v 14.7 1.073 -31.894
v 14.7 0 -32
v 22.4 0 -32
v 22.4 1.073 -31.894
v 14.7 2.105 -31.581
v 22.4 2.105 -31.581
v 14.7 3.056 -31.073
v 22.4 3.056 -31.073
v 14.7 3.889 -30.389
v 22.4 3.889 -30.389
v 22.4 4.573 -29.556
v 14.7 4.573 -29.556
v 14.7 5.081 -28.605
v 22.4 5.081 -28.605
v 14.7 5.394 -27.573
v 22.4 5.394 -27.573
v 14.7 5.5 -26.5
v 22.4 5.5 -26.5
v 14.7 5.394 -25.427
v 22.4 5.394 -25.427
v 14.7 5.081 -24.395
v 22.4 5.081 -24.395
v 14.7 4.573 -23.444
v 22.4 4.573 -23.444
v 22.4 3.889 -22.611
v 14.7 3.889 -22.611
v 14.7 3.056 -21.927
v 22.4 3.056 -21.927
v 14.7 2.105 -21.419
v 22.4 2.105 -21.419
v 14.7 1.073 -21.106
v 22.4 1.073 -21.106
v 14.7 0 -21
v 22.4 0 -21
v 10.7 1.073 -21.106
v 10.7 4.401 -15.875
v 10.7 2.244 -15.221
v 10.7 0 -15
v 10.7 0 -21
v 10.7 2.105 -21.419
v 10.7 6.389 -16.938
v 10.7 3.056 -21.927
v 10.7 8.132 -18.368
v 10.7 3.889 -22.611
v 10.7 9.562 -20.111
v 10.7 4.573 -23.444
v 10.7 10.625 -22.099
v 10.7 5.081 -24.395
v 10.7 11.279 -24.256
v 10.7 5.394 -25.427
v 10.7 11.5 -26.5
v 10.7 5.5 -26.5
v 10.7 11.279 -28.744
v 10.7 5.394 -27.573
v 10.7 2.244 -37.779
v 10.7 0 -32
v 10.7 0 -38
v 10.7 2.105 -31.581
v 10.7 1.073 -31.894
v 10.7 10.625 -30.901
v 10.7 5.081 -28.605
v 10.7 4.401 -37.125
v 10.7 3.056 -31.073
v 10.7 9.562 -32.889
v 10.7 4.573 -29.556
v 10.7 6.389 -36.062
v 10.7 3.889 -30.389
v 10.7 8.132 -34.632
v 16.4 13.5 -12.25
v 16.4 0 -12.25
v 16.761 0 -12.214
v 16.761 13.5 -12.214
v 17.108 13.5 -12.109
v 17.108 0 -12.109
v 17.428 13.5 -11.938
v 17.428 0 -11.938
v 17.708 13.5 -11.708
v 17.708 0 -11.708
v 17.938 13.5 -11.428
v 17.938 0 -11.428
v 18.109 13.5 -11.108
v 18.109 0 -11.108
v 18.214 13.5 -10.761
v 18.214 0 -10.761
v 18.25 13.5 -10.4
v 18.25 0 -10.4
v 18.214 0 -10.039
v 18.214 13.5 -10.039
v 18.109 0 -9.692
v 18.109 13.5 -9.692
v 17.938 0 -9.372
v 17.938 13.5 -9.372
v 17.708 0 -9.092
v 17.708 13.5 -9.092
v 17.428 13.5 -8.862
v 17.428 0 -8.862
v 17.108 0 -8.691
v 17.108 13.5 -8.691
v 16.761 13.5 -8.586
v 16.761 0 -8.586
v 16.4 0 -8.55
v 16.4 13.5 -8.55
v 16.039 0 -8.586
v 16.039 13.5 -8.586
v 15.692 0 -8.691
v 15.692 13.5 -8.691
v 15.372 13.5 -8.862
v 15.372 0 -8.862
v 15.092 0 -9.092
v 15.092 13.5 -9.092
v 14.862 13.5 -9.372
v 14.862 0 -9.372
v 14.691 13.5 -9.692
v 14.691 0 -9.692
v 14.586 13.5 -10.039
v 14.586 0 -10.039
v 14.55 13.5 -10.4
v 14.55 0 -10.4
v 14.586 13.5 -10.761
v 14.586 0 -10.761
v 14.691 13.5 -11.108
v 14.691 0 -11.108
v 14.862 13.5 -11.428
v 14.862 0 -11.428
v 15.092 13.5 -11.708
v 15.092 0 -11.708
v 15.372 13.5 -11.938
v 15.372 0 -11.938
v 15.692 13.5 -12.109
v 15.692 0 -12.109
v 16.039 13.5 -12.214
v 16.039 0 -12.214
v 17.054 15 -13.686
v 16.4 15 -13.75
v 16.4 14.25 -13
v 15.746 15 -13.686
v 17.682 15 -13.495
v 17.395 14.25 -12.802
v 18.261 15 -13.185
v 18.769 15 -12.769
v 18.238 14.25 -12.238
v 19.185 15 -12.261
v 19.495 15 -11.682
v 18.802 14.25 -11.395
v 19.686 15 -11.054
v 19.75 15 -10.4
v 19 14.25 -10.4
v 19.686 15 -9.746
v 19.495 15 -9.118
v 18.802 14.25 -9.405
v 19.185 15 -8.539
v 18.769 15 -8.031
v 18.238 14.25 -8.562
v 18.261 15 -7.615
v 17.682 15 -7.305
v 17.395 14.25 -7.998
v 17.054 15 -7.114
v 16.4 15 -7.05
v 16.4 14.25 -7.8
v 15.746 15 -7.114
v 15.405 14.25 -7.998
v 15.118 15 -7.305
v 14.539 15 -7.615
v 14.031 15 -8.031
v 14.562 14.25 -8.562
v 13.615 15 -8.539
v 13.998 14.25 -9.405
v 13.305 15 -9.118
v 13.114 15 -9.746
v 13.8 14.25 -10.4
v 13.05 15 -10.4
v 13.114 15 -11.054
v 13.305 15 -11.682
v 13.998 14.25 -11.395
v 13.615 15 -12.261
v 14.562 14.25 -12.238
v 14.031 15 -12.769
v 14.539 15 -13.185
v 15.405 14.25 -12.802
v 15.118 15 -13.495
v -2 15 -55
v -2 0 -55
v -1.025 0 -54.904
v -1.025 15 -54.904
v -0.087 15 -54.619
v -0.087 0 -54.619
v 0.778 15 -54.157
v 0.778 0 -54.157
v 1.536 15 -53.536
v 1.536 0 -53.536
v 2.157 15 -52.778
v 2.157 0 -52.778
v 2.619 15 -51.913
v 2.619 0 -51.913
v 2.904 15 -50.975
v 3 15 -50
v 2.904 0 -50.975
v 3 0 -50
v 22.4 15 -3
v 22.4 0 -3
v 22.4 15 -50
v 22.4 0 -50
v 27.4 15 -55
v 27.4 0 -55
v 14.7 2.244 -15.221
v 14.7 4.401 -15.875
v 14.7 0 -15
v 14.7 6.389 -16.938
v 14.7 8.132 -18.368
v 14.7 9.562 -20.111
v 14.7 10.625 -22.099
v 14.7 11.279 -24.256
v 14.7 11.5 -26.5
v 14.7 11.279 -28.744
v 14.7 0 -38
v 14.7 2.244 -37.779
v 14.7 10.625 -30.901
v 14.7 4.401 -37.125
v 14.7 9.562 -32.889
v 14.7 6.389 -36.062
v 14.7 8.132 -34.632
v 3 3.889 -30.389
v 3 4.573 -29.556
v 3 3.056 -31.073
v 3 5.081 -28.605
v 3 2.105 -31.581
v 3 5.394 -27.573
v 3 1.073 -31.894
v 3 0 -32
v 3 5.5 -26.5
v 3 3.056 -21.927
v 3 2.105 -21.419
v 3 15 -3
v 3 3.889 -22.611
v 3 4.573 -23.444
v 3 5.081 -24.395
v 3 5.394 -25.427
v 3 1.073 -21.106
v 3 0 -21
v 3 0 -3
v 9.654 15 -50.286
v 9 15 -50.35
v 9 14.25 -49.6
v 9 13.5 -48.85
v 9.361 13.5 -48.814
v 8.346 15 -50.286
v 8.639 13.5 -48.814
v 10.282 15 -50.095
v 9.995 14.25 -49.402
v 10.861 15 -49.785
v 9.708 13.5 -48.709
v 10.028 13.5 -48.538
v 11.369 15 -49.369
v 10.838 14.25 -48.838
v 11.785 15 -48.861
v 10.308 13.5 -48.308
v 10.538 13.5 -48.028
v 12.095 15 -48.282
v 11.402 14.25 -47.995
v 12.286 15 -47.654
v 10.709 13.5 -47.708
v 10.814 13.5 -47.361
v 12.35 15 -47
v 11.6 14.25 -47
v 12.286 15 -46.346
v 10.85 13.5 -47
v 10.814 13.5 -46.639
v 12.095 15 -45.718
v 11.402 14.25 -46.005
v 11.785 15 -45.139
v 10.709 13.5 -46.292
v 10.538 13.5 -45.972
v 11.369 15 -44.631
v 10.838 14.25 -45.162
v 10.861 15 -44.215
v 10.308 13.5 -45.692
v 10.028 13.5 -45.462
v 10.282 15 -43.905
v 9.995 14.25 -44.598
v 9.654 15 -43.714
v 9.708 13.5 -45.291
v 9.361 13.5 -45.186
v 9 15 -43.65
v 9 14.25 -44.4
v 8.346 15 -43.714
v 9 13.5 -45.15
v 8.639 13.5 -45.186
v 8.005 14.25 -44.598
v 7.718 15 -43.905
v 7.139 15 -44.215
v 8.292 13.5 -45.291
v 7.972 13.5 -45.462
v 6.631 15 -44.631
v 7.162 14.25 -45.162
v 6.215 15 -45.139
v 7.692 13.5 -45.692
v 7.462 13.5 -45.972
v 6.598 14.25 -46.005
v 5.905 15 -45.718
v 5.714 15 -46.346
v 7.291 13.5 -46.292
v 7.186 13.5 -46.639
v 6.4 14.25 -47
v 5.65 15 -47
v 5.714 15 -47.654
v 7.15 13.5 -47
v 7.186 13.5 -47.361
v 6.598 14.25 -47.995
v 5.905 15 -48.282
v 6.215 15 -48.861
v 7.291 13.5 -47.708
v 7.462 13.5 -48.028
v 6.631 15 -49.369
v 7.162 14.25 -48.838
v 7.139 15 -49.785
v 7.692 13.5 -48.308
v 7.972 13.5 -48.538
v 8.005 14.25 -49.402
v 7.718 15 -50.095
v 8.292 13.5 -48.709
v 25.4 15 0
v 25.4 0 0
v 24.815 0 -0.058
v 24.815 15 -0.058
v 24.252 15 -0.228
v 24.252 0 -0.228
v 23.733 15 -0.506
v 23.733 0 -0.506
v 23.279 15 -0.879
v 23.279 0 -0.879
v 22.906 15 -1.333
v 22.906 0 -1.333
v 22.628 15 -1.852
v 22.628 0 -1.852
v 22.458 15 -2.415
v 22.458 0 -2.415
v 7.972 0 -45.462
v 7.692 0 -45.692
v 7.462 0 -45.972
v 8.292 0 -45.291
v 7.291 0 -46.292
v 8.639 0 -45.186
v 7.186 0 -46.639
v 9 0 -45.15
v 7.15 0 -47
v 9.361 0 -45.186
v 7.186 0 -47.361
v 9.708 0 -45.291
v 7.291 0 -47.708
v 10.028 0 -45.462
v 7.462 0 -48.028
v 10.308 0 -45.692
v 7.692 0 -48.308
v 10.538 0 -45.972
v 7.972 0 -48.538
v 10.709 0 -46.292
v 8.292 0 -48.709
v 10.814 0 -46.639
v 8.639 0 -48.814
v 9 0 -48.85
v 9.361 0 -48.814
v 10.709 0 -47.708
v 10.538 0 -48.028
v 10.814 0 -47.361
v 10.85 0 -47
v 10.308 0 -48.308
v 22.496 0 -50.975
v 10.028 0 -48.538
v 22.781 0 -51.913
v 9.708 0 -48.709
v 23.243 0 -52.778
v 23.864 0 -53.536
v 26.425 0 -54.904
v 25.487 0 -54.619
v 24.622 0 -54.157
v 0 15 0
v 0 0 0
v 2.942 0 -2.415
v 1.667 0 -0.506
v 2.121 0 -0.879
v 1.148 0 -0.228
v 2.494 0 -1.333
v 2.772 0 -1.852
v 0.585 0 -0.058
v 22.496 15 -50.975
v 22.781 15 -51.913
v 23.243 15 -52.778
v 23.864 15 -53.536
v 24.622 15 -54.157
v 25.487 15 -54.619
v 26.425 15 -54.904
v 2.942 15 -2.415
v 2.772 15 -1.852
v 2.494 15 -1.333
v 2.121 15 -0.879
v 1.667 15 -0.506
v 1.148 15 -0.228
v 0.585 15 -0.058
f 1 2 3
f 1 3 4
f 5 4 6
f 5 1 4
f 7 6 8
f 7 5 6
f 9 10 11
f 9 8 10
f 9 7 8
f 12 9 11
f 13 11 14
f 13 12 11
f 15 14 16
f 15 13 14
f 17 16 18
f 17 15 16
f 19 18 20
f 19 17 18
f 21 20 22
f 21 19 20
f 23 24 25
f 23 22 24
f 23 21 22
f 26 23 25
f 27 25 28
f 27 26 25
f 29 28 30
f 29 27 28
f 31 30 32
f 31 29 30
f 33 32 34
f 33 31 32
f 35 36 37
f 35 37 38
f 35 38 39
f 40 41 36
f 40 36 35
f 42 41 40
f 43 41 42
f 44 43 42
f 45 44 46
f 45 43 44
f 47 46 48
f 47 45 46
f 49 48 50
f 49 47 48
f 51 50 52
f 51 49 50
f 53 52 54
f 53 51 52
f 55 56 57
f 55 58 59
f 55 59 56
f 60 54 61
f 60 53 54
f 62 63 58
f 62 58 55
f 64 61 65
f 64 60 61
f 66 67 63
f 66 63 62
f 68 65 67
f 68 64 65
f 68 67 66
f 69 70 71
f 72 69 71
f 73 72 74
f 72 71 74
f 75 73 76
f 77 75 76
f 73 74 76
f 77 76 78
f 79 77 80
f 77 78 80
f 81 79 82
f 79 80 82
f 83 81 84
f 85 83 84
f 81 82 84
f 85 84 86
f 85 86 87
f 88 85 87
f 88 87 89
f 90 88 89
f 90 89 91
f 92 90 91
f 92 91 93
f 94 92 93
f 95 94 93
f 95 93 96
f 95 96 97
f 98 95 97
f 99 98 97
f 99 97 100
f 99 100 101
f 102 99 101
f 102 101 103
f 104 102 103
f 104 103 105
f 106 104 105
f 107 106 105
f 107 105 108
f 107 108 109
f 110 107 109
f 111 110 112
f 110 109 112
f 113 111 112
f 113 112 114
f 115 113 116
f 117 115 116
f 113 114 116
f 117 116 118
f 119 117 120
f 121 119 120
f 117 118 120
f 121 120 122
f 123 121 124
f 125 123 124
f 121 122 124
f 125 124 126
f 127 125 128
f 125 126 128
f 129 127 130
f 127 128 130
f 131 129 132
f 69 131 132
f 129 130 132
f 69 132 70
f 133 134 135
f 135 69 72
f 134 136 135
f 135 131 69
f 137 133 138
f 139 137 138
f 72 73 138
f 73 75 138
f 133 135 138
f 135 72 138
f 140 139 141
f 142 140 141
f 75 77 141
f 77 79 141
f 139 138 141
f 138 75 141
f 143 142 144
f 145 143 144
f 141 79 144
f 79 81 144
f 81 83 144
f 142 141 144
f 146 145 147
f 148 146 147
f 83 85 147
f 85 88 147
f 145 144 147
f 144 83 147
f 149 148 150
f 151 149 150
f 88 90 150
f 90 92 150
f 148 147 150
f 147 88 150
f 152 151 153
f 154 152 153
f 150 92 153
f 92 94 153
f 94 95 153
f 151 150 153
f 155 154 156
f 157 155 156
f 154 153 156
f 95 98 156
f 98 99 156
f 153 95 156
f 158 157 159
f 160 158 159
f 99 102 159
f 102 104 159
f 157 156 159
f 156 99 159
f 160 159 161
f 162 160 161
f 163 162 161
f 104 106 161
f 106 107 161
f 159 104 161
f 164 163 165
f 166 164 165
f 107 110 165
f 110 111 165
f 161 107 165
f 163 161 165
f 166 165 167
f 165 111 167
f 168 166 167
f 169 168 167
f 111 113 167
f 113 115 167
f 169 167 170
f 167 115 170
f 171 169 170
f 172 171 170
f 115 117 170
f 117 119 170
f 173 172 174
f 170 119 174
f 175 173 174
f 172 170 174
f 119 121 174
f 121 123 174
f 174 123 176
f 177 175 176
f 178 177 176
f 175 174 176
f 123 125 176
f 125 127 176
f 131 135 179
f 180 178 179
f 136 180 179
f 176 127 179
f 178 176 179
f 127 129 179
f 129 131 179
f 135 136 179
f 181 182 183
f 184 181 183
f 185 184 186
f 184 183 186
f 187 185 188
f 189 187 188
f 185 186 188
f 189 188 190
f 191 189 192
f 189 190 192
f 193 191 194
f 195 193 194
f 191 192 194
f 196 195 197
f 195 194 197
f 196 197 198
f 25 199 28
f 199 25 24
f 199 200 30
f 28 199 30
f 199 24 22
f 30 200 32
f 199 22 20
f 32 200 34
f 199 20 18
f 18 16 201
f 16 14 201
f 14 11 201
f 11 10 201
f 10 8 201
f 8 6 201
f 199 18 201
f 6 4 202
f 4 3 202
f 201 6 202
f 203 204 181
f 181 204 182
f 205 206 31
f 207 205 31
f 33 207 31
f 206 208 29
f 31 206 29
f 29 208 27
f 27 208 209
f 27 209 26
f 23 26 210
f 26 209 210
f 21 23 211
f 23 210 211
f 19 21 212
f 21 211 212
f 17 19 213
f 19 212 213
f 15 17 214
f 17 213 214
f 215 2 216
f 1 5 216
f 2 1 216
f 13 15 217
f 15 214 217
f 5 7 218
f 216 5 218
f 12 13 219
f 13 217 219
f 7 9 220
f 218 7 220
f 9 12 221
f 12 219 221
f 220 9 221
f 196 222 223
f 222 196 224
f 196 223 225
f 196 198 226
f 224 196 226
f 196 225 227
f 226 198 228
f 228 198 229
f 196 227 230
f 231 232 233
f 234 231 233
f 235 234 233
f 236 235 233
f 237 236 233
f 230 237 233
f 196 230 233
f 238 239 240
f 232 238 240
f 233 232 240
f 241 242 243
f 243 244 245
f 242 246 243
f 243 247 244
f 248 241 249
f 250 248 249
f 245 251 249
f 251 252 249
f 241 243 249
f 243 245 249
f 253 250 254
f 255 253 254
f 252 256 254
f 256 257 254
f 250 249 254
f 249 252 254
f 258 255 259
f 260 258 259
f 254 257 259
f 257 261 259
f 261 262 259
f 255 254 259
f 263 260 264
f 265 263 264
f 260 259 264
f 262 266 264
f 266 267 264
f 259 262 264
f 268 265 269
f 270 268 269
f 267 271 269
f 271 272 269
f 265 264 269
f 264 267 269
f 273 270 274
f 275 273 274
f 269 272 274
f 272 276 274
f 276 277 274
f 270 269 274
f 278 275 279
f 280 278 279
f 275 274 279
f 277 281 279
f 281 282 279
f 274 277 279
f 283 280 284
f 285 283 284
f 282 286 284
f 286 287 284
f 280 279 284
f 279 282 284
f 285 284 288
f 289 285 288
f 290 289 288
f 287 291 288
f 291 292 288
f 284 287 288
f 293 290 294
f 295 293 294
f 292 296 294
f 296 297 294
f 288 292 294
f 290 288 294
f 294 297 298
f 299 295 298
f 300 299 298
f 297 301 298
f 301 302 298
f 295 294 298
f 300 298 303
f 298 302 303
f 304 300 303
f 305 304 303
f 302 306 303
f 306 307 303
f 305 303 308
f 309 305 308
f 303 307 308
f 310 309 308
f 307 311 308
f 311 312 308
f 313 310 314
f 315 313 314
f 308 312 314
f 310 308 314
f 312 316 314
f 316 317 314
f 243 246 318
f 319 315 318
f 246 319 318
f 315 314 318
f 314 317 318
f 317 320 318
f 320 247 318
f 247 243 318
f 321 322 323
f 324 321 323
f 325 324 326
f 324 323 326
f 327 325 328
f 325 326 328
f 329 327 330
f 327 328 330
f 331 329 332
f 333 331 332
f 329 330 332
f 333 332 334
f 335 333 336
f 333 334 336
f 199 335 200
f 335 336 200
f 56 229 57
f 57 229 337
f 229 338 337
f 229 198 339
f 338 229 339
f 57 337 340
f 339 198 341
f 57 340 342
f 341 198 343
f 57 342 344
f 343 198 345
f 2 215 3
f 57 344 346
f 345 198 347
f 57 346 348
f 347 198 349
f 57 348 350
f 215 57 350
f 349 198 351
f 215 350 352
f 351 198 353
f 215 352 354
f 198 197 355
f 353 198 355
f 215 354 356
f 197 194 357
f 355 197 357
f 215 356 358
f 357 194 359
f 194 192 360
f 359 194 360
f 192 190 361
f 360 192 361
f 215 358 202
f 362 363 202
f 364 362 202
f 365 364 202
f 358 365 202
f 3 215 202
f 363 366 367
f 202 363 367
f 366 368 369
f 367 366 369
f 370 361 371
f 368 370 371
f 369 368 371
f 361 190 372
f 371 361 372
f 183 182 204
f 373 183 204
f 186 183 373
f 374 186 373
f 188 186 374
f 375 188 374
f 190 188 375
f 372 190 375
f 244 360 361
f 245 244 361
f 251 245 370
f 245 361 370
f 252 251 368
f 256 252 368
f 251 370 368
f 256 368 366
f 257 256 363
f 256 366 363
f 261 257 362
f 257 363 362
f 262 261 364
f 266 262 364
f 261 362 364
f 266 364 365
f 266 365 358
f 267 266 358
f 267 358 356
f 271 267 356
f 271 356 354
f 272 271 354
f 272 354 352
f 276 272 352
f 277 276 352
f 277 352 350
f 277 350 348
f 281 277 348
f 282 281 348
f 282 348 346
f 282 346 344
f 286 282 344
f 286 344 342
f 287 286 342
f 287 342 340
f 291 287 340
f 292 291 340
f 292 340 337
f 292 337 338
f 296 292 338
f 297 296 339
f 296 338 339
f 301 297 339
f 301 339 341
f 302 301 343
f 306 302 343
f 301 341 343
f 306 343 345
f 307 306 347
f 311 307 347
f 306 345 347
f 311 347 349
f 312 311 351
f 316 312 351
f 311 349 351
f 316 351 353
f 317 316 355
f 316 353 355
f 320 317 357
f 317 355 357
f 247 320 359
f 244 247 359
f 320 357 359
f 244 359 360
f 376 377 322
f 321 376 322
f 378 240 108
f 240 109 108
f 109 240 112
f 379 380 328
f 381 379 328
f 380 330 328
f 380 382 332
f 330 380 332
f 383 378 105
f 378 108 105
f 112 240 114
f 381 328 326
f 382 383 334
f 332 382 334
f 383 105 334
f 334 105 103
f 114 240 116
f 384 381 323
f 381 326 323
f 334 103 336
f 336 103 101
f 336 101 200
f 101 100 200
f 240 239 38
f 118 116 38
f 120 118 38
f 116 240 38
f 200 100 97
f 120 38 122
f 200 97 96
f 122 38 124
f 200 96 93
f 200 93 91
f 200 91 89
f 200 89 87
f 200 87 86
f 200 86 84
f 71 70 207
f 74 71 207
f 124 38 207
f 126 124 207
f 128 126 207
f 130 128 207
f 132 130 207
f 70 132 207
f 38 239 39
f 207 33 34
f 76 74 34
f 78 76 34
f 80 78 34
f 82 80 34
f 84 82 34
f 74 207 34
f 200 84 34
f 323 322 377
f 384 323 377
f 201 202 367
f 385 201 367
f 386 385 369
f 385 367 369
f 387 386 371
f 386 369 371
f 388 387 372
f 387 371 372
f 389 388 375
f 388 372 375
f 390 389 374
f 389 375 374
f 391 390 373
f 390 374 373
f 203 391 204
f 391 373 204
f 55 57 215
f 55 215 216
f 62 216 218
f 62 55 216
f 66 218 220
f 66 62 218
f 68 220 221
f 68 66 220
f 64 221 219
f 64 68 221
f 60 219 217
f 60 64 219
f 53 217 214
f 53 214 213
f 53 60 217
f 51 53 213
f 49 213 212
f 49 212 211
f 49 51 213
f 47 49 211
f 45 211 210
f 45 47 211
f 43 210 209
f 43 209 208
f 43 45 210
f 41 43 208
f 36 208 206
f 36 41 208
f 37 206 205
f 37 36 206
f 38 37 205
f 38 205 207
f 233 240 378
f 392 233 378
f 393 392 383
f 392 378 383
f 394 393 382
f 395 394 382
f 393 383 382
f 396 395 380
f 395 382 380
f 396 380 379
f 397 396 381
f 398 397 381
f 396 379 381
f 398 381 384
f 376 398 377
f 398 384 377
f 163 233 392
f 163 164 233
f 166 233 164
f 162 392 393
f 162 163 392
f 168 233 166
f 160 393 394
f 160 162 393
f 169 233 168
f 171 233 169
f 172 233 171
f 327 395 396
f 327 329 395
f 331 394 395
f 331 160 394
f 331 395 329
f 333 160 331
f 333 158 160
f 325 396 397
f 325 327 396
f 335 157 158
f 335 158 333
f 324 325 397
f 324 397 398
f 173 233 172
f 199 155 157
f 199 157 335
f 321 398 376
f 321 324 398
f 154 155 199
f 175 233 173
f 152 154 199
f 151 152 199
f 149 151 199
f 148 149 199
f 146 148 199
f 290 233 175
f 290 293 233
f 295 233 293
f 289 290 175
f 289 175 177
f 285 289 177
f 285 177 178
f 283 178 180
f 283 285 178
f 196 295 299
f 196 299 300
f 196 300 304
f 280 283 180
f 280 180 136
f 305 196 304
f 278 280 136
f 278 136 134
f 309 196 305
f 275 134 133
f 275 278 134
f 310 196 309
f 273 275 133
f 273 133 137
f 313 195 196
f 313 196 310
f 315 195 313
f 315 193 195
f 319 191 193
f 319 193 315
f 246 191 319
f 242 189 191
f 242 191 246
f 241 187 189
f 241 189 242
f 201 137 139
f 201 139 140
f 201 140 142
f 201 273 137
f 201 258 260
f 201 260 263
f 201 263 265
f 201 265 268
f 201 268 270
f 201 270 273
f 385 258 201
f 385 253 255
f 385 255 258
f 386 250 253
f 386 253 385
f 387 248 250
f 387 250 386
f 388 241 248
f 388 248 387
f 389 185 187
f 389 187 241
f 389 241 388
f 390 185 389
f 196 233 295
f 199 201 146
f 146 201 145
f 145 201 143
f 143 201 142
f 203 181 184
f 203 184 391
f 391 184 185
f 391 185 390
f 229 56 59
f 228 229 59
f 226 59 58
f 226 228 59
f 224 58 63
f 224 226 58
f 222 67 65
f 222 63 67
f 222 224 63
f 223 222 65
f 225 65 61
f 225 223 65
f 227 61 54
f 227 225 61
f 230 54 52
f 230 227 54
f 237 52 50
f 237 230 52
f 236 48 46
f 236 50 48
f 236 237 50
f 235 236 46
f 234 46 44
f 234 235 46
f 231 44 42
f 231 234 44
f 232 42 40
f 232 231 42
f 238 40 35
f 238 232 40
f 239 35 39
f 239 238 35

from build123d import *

# Parameters (mm, degrees)
RESSALTO_EXTRUS_O1_DEPTH   = 15
CORTE_EXTRUS_O1_DEPTH      = 59.873508474
CORTE_EXTRUS_O1_DEPTH_BACK = 59.873508474
ESBO_O3_R                  = 5.5
CORTE_EXTRUS_O2_DEPTH      = 2
CORTE_EXTRUS_O2_DEPTH_BACK = 2
ESBO_O4_R                  = 11.5
ESBO_O6_R                  = 1.85
CORTE_EXTRUS_O4_DEPTH      = 64.251561246
CHANFRO1_SIZE              = 1.5


with BuildPart() as part:
    # Esboço1 → Ressalto-extrusão1 (new body)
    with BuildSketch(Plane(origin=(0, 0, 0), x_dir=(1, 0, 0), z_dir=(0, 1, 0))):
        with BuildLine():
            Line((3, 50), (3, 3))
            ThreePointArc((3, 3), (2.121320344, 0.878679656), (0, 0))
            Line((0, 0), (25.4, 0))
            ThreePointArc((25.4, 0), (23.278679656, 0.878679656), (22.4, 3))
            Line((22.4, 3), (22.4, 50))
            ThreePointArc((22.4, 50), (23.864466094, 53.535533906), (27.4, 55))
            Line((27.4, 55), (-2, 55))
            ThreePointArc((-2, 55), (1.535533906, 53.535533906), (3, 50))
        make_face()
    extrude(amount=RESSALTO_EXTRUS_O1_DEPTH)

    # Esboço3 → Corte-extrusão1 (cut, two sides: drawn at the far end of the back side and taken through both)
    with BuildSketch(Plane(origin=(12.7, 0, 0), x_dir=(0, 0, -1), z_dir=(1, 0, 0)).offset(-CORTE_EXTRUS_O1_DEPTH_BACK)):
        with Locations((26.5, 0)):
            Circle(ESBO_O3_R)
    extrude(amount=CORTE_EXTRUS_O1_DEPTH + CORTE_EXTRUS_O1_DEPTH_BACK, mode=Mode.SUBTRACT)

    # Esboço4 → Corte-extrusão2 (cut, two sides: drawn at the far end of the back side and taken through both)
    with BuildSketch(Plane(origin=(12.7, 0, 0), x_dir=(0, 0, -1), z_dir=(1, 0, 0)).offset(-CORTE_EXTRUS_O2_DEPTH_BACK)):
        with Locations((26.5, 0)):
            Circle(ESBO_O4_R)
    extrude(amount=CORTE_EXTRUS_O2_DEPTH + CORTE_EXTRUS_O2_DEPTH_BACK, mode=Mode.SUBTRACT)

    # Esboço6 → Corte-extrusão4 (cut, through all)
    with BuildSketch(Plane.XZ):
        with Locations(Location((16.4, -10.4, 0), (0, 0, 270))):
            Circle(ESBO_O6_R)
        with Locations(Location((9, -47, 0), (0, 0, 270))):
            Circle(ESBO_O6_R)
    extrude(amount=-CORTE_EXTRUS_O4_DEPTH, mode=Mode.SUBTRACT)

    # Chanfro1
    chanfro1_edges = [part.edges().sort_by_distance(p)[0] for p in [
        (16.4, 15, -8.55),
        (9, 15, -45.15),
    ]]
    chamfer(chanfro1_edges, length=CHANFRO1_SIZE)


solid = part.part
